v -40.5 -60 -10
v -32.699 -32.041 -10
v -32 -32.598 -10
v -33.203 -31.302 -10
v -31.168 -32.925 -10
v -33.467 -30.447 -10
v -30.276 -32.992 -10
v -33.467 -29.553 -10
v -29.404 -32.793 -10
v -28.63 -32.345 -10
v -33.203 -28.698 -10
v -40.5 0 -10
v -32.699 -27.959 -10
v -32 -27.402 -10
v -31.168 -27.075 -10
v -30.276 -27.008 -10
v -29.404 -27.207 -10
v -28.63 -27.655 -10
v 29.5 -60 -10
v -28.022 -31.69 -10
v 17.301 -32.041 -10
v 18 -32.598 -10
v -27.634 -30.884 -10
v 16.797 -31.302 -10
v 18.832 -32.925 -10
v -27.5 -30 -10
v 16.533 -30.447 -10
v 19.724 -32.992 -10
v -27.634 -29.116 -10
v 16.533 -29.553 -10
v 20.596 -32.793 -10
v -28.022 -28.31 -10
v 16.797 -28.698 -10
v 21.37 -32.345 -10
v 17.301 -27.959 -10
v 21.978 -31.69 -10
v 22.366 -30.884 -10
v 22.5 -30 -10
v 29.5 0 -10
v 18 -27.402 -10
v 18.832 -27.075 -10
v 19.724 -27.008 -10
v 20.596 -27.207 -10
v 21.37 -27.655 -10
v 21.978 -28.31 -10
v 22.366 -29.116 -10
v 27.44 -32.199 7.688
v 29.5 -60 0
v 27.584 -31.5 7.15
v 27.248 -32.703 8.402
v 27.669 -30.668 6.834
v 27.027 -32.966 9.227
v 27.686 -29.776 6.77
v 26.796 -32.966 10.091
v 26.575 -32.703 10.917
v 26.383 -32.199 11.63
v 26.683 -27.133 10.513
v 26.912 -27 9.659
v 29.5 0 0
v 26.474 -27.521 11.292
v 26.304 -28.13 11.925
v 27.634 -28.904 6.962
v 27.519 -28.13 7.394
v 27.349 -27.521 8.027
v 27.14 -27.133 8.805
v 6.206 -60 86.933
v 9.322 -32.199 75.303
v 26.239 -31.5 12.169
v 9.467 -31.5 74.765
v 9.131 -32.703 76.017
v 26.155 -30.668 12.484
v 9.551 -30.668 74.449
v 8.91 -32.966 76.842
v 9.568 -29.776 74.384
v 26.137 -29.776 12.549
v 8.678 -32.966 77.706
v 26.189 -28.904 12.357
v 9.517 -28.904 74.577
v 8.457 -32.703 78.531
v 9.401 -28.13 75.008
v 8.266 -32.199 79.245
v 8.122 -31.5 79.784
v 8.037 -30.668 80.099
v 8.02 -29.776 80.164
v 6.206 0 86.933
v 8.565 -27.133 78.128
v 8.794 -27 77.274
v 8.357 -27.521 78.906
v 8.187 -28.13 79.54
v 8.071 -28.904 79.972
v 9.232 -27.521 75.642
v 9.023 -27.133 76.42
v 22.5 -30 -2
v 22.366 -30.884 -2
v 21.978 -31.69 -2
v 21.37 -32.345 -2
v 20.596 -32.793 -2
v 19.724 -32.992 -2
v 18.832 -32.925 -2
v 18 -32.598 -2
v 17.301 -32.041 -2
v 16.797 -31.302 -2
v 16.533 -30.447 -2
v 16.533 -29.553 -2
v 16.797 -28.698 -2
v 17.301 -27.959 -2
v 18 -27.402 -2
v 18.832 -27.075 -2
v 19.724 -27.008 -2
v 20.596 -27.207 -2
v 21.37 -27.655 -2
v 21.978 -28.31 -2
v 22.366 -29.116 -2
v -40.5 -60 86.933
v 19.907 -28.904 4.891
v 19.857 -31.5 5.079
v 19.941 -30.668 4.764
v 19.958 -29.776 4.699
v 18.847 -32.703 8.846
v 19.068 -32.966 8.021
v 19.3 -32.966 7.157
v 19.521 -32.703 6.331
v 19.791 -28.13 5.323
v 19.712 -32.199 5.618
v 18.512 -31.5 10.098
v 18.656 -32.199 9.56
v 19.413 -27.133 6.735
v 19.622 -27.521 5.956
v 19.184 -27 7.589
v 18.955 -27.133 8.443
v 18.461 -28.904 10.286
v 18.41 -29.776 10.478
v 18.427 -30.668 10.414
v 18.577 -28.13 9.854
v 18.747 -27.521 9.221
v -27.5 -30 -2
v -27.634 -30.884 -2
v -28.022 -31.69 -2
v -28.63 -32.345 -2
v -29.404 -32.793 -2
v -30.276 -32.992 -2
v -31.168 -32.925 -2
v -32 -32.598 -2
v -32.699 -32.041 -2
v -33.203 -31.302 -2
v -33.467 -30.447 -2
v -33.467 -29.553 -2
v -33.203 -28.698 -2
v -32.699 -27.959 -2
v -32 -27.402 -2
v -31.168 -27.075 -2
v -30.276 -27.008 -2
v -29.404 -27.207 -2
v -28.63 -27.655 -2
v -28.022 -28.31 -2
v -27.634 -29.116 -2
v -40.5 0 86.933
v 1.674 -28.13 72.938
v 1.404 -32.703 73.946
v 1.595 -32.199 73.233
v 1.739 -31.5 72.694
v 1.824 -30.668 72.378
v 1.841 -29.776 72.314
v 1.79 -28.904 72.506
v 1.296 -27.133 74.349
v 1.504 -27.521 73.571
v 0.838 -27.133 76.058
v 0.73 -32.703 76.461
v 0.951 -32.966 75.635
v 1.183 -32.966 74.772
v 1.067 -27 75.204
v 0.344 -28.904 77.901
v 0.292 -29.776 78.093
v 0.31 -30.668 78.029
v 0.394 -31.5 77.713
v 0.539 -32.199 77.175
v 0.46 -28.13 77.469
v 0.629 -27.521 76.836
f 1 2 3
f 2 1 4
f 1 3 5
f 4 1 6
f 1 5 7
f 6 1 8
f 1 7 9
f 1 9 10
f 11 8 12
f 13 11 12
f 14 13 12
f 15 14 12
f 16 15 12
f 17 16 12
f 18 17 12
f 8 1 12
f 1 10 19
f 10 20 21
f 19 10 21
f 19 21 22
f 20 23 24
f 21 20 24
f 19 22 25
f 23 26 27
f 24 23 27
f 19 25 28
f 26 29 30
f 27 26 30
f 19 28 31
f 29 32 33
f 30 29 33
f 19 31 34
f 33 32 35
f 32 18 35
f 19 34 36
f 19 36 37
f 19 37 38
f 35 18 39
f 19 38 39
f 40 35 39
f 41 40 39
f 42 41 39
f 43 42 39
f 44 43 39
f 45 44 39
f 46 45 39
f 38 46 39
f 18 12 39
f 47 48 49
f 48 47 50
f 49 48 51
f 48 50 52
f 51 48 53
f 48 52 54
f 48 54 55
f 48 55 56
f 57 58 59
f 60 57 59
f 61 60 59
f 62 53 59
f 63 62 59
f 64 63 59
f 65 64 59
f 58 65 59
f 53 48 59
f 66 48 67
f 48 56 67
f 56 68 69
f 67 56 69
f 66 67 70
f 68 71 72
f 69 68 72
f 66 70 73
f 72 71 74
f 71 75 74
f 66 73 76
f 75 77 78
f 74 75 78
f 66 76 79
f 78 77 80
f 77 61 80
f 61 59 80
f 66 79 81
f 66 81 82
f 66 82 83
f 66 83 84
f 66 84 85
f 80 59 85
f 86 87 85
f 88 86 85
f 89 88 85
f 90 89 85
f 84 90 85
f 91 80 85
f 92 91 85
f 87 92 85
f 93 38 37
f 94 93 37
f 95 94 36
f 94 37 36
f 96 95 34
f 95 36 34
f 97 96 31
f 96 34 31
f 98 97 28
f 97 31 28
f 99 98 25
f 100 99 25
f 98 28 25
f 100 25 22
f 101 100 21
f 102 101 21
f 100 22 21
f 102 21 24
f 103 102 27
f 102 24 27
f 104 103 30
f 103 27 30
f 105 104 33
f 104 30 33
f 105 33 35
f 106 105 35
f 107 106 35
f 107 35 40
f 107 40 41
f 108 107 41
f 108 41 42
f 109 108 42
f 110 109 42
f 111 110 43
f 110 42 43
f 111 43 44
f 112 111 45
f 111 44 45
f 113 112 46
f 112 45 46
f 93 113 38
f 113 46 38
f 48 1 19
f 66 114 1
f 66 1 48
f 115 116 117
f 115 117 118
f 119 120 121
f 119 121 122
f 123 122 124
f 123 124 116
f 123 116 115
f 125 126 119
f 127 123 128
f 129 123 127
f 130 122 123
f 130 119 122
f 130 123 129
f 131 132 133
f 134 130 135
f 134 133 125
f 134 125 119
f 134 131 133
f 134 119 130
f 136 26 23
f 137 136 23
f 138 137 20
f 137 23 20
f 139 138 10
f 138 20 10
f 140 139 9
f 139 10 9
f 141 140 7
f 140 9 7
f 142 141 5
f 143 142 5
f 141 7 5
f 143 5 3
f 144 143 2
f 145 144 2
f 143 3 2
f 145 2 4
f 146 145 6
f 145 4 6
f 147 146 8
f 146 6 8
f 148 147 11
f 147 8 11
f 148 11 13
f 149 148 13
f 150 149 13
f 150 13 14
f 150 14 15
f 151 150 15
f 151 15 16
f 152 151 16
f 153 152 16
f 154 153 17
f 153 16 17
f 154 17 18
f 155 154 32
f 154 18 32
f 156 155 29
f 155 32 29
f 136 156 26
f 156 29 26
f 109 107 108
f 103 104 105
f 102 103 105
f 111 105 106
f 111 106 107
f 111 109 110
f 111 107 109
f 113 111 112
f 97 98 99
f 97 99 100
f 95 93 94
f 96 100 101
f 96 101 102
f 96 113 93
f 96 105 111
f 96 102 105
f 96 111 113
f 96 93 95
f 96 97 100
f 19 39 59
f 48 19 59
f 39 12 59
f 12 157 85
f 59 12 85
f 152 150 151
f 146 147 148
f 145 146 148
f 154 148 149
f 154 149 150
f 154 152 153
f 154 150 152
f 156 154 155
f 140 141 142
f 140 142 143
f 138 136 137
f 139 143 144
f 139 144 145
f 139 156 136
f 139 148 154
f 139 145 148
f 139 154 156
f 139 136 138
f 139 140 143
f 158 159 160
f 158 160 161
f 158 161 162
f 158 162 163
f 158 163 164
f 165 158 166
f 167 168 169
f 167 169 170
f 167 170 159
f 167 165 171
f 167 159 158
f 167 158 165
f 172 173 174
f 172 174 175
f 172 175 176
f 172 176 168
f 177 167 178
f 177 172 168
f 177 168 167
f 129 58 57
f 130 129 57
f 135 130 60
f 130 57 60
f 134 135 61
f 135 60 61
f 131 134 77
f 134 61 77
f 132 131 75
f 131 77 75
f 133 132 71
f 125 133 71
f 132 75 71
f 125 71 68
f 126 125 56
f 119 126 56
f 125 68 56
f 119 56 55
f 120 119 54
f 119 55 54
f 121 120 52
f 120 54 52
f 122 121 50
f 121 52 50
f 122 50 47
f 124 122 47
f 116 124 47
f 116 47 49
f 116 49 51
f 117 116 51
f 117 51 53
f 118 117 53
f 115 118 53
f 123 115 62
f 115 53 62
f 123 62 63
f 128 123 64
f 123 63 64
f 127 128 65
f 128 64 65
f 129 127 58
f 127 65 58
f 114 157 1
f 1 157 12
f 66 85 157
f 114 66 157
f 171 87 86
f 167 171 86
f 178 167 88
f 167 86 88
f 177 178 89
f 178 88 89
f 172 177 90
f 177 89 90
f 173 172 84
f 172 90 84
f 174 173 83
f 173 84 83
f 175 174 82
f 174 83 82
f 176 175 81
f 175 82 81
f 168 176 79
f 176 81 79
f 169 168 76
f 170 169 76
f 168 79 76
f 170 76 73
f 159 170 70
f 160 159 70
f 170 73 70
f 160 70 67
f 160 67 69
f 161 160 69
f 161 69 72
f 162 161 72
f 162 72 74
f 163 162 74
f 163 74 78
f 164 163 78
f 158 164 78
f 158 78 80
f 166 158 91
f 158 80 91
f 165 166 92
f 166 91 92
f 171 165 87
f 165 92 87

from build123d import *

# Parameters (mm, degrees)
F1_DEPTH = 60
F2_R     = 3
F3_DEPTH = 8
F4_R     = 3
F5_DEPTH = 8


# Not quite as in the source:
# - a feature names something its author has since deleted; it is built from what else it names


with BuildPart() as f1:
    # F0 (on Front) → F1 (new body)
    with BuildSketch(Plane.XZ):
        Polygon((29.4997055829, 0), (6.2059915236, 86.933324366), (-40.5002944171, 86.933324366), (-40.5002944171, -10), (29.4997055829, -10), align=None)
    extrude(amount=F1_DEPTH)

    # F2 (on face) → F3 (cut)
    with BuildSketch(Plane(origin=(0, 0, -10), x_dir=(1, 0, 0), z_dir=(0, 0, -1))):
        with Locations((-30.5002944171, 30)):
            Circle(F2_R)
        with Locations((19.4997055829, 30)):
            Circle(F2_R)
    extrude(amount=-F3_DEPTH, mode=Mode.SUBTRACT)

    # F4 (on face) → F5 (cut)
    with BuildSketch(Plane(origin=(27.5236000109, 0, 7.3749263957), x_dir=(0, 1, 0), z_dir=(0.9659258263, 0, 0.2588190451))):
        with Locations((-30, 72.3649143702)):
            Circle(F4_R)
        with Locations((-30, 2.3649143702)):
            Circle(F4_R)
    extrude(amount=-F5_DEPTH, mode=Mode.SUBTRACT)


solid = f1.part
